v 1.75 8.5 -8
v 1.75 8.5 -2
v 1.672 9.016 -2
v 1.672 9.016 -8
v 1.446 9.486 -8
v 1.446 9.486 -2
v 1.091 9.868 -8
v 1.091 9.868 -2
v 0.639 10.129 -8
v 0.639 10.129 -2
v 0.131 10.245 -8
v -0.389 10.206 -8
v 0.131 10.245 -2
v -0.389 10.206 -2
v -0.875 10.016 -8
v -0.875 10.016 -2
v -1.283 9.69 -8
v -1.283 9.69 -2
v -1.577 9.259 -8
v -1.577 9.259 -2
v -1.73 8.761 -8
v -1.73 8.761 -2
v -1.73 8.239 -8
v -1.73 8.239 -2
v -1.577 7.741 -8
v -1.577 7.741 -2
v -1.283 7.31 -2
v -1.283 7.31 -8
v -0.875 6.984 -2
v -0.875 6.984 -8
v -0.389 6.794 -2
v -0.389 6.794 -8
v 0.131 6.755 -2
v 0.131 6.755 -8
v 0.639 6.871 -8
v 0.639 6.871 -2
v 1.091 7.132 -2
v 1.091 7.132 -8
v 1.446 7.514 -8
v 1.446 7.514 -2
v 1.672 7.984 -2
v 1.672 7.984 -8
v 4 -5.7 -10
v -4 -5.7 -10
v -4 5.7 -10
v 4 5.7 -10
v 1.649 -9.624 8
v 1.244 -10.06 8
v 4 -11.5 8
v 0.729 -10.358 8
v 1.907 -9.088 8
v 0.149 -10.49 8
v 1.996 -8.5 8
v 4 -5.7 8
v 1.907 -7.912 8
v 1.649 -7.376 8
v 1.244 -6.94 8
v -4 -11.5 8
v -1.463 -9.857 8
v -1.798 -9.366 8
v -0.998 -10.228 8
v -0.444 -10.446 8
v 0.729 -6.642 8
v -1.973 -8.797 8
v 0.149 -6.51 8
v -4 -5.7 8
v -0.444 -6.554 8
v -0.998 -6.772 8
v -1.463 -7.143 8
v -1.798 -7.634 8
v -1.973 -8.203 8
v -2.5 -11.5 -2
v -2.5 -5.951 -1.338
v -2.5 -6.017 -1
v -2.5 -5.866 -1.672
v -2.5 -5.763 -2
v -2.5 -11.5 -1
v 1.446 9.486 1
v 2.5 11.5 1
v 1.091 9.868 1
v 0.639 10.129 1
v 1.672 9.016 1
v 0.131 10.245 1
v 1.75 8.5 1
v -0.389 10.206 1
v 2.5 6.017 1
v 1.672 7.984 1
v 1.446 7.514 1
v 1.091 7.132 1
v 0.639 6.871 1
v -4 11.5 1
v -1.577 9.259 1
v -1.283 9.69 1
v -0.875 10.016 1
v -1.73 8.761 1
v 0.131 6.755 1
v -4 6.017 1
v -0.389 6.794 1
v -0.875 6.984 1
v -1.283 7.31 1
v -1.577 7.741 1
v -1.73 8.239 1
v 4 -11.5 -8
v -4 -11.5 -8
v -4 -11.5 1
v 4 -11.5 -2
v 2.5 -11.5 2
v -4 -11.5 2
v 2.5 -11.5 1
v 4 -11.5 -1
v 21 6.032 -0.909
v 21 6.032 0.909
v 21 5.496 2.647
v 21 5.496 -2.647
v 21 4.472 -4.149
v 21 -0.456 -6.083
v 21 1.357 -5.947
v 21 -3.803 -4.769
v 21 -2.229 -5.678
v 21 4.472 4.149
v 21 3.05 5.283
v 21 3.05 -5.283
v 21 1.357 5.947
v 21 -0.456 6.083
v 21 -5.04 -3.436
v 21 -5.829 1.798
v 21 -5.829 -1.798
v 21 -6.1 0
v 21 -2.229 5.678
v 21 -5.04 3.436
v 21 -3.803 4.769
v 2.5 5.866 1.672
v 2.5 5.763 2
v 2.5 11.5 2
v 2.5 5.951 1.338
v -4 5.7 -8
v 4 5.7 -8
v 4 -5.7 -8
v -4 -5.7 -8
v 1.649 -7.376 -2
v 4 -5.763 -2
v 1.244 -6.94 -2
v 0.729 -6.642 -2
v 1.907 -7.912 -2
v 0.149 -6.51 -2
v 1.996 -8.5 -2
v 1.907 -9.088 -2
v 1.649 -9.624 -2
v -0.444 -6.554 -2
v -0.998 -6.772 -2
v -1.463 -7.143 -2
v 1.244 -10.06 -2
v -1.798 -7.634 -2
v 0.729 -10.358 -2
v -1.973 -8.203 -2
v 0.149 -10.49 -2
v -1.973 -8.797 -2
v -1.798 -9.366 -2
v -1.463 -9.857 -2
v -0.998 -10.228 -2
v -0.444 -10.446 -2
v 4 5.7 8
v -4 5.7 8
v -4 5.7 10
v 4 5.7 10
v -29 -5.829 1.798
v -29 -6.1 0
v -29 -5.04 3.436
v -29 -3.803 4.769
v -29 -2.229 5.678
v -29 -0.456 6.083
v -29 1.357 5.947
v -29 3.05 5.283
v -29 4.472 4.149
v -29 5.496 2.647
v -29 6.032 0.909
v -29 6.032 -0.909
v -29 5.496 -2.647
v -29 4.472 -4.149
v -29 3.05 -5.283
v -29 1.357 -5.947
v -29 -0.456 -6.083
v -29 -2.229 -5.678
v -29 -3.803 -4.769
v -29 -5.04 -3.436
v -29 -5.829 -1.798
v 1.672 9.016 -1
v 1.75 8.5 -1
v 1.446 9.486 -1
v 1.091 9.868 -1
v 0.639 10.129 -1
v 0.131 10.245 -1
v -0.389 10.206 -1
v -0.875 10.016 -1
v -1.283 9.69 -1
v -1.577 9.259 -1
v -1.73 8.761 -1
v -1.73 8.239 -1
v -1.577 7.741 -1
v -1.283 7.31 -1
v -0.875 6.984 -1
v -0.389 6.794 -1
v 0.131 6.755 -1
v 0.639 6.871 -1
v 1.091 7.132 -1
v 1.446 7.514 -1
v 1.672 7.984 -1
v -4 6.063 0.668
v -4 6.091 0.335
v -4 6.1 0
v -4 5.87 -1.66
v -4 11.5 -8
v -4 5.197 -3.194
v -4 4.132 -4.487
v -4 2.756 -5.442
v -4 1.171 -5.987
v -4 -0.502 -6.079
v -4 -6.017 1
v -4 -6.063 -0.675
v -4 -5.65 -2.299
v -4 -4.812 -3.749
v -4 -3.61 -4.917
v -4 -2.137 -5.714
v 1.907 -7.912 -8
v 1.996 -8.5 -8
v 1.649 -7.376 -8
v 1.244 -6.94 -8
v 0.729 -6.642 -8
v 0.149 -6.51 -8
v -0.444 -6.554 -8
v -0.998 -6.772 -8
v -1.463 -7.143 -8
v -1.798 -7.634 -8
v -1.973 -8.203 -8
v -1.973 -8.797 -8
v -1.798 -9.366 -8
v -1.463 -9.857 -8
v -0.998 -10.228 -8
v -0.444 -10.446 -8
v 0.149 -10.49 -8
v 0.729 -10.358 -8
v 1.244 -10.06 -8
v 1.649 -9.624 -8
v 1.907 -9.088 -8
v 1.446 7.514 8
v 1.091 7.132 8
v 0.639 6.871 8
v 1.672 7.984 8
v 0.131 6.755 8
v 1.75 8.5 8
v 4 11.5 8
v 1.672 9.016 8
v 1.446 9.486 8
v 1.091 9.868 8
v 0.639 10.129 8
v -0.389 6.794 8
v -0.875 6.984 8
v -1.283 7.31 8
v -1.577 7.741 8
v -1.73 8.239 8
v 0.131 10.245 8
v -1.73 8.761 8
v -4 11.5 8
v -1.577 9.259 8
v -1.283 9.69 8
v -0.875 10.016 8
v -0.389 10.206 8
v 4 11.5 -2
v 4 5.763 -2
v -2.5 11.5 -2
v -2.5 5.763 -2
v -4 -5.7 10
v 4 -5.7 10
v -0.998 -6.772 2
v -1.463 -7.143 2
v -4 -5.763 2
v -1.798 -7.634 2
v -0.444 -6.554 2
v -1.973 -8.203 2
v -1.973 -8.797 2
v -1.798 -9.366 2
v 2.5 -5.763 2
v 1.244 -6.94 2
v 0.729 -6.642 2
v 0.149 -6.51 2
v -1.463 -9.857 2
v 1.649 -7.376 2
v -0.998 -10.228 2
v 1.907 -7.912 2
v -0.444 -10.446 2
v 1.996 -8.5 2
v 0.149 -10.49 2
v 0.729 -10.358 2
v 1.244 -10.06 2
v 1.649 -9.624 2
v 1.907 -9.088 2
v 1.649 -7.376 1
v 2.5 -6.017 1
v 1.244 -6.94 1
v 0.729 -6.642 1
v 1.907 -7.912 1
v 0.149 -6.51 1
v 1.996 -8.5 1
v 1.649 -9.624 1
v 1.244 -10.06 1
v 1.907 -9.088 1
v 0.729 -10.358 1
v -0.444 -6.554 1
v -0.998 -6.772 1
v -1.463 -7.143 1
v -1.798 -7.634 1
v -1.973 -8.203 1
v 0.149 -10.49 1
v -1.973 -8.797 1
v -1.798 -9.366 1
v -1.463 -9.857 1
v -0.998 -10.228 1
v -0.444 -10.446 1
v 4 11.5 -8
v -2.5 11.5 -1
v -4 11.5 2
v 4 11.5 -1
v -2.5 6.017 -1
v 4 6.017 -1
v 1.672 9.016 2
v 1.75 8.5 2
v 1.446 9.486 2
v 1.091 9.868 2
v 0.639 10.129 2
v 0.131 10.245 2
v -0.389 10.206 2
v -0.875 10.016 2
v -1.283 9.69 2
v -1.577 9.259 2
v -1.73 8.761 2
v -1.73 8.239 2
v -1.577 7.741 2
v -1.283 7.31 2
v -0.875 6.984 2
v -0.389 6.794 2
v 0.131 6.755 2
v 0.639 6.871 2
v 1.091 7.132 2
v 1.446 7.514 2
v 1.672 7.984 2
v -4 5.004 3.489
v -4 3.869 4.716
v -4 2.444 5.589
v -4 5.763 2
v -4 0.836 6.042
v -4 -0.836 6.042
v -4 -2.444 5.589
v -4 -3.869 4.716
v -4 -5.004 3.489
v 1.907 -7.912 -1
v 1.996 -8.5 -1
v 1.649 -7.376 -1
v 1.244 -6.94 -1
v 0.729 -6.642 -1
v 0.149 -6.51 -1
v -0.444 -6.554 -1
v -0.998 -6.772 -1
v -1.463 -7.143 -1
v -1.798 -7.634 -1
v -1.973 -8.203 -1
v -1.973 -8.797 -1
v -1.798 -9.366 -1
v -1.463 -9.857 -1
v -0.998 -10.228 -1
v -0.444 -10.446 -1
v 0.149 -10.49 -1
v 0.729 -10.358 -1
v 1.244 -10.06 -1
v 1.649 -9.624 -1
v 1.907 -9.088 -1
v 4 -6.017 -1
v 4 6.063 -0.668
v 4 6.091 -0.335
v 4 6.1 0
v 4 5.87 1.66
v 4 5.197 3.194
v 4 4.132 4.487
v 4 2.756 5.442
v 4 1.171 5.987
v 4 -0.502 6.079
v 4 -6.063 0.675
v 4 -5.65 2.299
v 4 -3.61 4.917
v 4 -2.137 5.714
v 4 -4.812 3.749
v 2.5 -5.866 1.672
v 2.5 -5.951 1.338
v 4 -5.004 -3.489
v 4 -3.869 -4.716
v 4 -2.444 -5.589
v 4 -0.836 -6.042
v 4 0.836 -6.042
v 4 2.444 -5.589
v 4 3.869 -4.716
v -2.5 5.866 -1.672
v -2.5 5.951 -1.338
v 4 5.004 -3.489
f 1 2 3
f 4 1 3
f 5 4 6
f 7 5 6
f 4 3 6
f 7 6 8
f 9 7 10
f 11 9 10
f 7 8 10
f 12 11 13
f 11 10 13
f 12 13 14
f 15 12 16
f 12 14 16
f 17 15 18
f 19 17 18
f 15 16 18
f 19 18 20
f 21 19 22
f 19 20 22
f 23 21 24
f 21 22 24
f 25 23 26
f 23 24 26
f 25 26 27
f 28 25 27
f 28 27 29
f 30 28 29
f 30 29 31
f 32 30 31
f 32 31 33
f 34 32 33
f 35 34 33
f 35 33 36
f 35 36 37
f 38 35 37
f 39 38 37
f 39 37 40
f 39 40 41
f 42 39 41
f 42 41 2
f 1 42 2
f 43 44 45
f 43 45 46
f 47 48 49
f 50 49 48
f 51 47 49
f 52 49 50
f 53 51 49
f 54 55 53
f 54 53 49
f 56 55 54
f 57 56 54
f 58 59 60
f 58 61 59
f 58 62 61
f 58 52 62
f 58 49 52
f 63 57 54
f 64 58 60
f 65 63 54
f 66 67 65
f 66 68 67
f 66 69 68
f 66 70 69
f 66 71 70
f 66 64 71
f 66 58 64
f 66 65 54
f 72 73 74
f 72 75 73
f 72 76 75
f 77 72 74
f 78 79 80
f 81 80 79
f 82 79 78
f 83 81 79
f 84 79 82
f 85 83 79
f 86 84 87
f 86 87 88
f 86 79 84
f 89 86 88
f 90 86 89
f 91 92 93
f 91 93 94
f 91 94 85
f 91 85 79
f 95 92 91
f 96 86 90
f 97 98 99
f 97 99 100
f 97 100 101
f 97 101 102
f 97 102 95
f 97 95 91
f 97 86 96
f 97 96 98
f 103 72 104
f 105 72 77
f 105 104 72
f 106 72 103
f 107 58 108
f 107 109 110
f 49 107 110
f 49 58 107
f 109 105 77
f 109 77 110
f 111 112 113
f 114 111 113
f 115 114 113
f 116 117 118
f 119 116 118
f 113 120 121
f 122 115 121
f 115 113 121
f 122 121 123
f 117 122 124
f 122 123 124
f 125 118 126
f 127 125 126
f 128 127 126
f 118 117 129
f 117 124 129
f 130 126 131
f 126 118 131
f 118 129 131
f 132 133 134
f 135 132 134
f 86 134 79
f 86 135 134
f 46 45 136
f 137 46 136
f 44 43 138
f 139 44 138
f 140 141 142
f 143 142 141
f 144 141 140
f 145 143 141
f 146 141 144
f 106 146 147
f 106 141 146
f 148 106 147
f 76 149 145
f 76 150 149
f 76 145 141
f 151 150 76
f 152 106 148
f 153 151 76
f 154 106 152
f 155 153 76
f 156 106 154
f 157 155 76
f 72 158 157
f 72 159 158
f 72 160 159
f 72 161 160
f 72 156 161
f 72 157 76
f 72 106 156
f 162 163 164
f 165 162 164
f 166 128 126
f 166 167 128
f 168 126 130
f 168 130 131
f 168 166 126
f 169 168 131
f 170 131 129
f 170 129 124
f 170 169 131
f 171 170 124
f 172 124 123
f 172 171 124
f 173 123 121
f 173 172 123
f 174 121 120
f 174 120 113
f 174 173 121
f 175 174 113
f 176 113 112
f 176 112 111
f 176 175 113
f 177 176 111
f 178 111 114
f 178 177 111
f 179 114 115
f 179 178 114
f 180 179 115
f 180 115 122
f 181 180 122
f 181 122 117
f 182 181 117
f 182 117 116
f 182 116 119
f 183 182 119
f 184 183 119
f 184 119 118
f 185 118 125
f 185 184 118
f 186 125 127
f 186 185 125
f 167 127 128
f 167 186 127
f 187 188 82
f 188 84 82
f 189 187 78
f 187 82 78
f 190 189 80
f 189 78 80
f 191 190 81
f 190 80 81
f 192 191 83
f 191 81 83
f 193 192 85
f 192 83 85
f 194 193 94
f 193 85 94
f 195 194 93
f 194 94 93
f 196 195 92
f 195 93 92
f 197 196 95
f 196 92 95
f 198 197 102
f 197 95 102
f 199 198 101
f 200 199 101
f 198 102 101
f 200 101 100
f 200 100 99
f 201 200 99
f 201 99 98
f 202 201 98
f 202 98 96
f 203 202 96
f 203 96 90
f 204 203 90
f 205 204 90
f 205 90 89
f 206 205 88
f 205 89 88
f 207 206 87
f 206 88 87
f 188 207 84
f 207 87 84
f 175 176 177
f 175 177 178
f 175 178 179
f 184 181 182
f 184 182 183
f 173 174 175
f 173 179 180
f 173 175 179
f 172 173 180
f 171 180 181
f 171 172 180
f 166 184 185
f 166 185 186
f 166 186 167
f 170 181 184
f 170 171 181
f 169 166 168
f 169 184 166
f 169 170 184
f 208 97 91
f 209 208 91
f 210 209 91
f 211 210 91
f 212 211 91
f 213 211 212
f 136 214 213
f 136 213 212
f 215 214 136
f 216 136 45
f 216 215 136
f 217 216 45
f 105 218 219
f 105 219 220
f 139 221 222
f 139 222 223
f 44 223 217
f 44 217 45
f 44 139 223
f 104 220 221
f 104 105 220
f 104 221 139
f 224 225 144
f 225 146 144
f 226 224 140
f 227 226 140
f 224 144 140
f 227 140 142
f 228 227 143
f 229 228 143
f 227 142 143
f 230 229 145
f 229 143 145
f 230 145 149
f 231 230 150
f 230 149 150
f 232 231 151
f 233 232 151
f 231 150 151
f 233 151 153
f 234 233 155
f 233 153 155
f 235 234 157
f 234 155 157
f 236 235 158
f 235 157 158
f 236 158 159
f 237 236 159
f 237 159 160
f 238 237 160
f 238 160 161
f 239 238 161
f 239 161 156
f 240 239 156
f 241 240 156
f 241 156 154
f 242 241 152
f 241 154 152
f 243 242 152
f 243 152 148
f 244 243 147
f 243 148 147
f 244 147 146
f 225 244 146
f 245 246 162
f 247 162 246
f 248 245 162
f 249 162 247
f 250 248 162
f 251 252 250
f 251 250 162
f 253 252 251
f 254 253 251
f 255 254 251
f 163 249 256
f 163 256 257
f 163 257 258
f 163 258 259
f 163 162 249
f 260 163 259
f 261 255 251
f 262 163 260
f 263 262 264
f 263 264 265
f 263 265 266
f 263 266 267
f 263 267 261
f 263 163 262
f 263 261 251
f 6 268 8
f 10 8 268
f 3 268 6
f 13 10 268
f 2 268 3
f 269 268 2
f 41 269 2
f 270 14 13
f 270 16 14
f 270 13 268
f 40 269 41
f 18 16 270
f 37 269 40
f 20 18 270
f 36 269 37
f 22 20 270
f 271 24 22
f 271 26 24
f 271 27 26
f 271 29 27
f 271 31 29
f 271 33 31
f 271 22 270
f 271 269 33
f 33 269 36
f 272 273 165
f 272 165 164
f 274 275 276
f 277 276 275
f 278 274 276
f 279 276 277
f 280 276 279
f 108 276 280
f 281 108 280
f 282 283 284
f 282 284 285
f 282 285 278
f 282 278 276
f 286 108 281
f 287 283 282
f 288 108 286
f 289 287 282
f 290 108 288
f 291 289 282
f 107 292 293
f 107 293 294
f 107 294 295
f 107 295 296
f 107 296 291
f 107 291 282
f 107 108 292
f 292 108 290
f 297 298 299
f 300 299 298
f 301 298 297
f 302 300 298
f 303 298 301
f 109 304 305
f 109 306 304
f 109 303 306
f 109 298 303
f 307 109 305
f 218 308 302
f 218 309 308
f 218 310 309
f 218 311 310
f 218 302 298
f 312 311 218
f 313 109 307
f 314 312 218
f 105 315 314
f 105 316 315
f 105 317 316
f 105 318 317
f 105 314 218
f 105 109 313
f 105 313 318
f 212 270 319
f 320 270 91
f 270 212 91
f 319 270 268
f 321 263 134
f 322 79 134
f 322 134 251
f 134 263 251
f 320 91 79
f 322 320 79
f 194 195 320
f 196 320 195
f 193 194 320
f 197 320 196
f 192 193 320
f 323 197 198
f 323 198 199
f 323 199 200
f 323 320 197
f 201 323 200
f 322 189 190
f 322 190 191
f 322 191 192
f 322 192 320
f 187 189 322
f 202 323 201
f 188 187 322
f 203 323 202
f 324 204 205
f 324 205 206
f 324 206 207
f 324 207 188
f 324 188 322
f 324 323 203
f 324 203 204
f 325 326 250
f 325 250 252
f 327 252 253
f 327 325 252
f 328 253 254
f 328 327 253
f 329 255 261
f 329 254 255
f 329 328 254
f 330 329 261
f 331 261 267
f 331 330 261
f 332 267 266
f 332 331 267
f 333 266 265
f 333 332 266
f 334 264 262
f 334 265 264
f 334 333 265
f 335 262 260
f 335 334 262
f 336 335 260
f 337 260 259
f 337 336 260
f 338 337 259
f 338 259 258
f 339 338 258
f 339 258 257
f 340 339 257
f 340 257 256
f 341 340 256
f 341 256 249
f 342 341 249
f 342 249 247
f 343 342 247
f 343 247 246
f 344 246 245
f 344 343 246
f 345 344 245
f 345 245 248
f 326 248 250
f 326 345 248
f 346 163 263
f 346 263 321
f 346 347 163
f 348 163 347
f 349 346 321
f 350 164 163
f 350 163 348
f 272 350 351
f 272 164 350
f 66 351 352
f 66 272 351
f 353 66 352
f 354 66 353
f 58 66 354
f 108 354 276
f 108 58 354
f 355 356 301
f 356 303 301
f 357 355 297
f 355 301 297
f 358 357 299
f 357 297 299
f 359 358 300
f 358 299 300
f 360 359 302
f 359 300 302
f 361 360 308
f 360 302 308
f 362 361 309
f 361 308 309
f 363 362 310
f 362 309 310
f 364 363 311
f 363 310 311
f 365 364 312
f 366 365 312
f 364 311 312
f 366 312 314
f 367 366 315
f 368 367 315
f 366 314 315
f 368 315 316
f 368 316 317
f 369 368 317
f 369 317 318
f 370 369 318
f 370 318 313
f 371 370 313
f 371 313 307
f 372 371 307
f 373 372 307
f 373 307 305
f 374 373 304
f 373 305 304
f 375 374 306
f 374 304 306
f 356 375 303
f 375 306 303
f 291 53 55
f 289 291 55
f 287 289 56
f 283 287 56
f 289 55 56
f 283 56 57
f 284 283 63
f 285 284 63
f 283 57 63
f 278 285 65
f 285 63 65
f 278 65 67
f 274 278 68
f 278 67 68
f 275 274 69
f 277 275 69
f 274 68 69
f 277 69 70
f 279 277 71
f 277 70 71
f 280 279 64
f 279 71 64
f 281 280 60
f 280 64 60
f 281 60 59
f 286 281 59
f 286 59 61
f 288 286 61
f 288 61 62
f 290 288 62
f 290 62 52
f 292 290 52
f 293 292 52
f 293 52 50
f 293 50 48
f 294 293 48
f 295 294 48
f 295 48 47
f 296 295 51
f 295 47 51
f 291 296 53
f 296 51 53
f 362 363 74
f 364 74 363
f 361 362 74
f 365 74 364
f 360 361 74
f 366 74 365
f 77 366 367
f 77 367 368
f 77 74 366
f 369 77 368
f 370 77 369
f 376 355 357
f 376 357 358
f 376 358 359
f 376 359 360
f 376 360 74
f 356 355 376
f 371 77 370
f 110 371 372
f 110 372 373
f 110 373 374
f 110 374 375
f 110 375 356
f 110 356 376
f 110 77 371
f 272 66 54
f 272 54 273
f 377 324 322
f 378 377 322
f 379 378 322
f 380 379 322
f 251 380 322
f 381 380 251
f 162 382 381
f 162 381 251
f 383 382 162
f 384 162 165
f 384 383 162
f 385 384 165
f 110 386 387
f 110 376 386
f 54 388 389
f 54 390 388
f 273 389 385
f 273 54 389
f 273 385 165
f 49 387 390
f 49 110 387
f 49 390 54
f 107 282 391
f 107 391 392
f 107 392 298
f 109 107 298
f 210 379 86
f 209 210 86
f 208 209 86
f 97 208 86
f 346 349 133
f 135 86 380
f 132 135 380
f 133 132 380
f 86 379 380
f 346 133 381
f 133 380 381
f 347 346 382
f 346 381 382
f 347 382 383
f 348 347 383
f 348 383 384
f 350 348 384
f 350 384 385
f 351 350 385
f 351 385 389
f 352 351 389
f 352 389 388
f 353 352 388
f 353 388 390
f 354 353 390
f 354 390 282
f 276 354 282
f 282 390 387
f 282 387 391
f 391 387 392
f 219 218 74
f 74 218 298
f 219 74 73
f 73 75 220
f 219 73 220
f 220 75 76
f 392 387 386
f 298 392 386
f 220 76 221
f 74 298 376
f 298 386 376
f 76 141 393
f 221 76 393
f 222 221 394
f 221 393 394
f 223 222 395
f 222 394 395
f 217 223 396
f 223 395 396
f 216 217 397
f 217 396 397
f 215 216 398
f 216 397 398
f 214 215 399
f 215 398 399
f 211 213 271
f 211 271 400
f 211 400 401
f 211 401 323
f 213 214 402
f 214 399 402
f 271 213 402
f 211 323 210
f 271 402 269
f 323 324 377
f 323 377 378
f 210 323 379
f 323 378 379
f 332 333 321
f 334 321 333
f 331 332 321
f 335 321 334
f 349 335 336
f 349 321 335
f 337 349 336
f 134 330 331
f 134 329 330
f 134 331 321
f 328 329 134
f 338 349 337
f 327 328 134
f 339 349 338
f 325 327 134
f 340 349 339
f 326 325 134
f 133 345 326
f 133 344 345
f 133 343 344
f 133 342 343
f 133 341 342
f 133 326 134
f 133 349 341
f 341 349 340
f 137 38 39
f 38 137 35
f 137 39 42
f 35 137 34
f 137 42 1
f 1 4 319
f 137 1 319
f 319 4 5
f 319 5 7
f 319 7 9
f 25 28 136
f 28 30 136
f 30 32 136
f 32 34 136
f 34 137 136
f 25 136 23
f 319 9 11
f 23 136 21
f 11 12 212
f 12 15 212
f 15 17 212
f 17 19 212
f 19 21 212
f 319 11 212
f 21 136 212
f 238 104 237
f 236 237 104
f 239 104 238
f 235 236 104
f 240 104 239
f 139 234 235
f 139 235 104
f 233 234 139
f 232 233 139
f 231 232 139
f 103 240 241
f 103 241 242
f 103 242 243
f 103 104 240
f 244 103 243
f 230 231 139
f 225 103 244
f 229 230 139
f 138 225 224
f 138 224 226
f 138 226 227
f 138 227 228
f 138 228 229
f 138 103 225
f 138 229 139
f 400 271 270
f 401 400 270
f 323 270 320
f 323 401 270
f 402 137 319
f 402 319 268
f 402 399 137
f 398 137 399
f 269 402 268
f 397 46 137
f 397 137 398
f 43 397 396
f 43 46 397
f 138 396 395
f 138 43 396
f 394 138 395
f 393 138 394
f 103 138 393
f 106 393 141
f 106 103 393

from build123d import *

# Parameters (mm, degrees)
F1_DEPTH      = 11.5
F2_R          = 1.75
F2_R_2        = 1.995633
F3_DEPTH      = 20
F4_R          = 6.1
F5_DEPTH      = 12.5
F6_W          = 5.8
F6_H          = 2
F7_DEPTH      = 12.5
F8_R          = 6.1
F9_DEPTH      = 25
F9_DEPTH_BACK = 25


with BuildPart() as f1:
    # F0 (on Front) → F1 (new body, symmetric)
    with BuildSketch(Plane.XZ):
        Polygon((4, 10), (-4, 10), (-4, 2), (2.5, 2), (2.5, 1), (-4, 1), (-4, -10), (4, -10), (4, -2), (-2.5, -2), (-2.5, -1), (4, -1), align=None)
    extrude(amount=F1_DEPTH, both=True)

    # F2 (on Top) → F3 (cut, symmetric)
    with BuildSketch(Plane.XY):
        with Locations((0, 8.5)):
            Circle(F2_R)
        with Locations((0, -8.5)):
            Circle(F2_R_2)
    extrude(amount=F3_DEPTH, both=True, mode=Mode.SUBTRACT)

    # F4 (on Right) → F5 (cut, symmetric)
    with BuildSketch(Plane.YZ):
        Circle(F4_R)
    extrude(amount=F5_DEPTH, both=True, mode=Mode.SUBTRACT)

    # F6 (on Right) → F7 (cut, symmetric)
    with BuildSketch(Plane.YZ):
        with Locations((-8.6, 9)):
            Rectangle(F6_W, F6_H)
        with Locations((8.6, 9)):
            Rectangle(F6_W, F6_H)
        with Locations((8.6, -9)):
            Rectangle(F6_W, F6_H)
        with Locations((-8.6, -9)):
            Rectangle(F6_W, F6_H)
    extrude(amount=F7_DEPTH, both=True, mode=Mode.SUBTRACT)


with BuildPart() as f9:
    # F8 (on face) → F9 (new body, two sides)
    with BuildSketch(Plane(origin=(-4, 0, 0), x_dir=(0, -1, 0), z_dir=(-1, 0, 0))) as f9_sk:
        Circle(F8_R)
    extrude(amount=F9_DEPTH)
    extrude(f9_sk.sketch, amount=-F9_DEPTH_BACK)


solid = Compound([f1.part, f9.part])
